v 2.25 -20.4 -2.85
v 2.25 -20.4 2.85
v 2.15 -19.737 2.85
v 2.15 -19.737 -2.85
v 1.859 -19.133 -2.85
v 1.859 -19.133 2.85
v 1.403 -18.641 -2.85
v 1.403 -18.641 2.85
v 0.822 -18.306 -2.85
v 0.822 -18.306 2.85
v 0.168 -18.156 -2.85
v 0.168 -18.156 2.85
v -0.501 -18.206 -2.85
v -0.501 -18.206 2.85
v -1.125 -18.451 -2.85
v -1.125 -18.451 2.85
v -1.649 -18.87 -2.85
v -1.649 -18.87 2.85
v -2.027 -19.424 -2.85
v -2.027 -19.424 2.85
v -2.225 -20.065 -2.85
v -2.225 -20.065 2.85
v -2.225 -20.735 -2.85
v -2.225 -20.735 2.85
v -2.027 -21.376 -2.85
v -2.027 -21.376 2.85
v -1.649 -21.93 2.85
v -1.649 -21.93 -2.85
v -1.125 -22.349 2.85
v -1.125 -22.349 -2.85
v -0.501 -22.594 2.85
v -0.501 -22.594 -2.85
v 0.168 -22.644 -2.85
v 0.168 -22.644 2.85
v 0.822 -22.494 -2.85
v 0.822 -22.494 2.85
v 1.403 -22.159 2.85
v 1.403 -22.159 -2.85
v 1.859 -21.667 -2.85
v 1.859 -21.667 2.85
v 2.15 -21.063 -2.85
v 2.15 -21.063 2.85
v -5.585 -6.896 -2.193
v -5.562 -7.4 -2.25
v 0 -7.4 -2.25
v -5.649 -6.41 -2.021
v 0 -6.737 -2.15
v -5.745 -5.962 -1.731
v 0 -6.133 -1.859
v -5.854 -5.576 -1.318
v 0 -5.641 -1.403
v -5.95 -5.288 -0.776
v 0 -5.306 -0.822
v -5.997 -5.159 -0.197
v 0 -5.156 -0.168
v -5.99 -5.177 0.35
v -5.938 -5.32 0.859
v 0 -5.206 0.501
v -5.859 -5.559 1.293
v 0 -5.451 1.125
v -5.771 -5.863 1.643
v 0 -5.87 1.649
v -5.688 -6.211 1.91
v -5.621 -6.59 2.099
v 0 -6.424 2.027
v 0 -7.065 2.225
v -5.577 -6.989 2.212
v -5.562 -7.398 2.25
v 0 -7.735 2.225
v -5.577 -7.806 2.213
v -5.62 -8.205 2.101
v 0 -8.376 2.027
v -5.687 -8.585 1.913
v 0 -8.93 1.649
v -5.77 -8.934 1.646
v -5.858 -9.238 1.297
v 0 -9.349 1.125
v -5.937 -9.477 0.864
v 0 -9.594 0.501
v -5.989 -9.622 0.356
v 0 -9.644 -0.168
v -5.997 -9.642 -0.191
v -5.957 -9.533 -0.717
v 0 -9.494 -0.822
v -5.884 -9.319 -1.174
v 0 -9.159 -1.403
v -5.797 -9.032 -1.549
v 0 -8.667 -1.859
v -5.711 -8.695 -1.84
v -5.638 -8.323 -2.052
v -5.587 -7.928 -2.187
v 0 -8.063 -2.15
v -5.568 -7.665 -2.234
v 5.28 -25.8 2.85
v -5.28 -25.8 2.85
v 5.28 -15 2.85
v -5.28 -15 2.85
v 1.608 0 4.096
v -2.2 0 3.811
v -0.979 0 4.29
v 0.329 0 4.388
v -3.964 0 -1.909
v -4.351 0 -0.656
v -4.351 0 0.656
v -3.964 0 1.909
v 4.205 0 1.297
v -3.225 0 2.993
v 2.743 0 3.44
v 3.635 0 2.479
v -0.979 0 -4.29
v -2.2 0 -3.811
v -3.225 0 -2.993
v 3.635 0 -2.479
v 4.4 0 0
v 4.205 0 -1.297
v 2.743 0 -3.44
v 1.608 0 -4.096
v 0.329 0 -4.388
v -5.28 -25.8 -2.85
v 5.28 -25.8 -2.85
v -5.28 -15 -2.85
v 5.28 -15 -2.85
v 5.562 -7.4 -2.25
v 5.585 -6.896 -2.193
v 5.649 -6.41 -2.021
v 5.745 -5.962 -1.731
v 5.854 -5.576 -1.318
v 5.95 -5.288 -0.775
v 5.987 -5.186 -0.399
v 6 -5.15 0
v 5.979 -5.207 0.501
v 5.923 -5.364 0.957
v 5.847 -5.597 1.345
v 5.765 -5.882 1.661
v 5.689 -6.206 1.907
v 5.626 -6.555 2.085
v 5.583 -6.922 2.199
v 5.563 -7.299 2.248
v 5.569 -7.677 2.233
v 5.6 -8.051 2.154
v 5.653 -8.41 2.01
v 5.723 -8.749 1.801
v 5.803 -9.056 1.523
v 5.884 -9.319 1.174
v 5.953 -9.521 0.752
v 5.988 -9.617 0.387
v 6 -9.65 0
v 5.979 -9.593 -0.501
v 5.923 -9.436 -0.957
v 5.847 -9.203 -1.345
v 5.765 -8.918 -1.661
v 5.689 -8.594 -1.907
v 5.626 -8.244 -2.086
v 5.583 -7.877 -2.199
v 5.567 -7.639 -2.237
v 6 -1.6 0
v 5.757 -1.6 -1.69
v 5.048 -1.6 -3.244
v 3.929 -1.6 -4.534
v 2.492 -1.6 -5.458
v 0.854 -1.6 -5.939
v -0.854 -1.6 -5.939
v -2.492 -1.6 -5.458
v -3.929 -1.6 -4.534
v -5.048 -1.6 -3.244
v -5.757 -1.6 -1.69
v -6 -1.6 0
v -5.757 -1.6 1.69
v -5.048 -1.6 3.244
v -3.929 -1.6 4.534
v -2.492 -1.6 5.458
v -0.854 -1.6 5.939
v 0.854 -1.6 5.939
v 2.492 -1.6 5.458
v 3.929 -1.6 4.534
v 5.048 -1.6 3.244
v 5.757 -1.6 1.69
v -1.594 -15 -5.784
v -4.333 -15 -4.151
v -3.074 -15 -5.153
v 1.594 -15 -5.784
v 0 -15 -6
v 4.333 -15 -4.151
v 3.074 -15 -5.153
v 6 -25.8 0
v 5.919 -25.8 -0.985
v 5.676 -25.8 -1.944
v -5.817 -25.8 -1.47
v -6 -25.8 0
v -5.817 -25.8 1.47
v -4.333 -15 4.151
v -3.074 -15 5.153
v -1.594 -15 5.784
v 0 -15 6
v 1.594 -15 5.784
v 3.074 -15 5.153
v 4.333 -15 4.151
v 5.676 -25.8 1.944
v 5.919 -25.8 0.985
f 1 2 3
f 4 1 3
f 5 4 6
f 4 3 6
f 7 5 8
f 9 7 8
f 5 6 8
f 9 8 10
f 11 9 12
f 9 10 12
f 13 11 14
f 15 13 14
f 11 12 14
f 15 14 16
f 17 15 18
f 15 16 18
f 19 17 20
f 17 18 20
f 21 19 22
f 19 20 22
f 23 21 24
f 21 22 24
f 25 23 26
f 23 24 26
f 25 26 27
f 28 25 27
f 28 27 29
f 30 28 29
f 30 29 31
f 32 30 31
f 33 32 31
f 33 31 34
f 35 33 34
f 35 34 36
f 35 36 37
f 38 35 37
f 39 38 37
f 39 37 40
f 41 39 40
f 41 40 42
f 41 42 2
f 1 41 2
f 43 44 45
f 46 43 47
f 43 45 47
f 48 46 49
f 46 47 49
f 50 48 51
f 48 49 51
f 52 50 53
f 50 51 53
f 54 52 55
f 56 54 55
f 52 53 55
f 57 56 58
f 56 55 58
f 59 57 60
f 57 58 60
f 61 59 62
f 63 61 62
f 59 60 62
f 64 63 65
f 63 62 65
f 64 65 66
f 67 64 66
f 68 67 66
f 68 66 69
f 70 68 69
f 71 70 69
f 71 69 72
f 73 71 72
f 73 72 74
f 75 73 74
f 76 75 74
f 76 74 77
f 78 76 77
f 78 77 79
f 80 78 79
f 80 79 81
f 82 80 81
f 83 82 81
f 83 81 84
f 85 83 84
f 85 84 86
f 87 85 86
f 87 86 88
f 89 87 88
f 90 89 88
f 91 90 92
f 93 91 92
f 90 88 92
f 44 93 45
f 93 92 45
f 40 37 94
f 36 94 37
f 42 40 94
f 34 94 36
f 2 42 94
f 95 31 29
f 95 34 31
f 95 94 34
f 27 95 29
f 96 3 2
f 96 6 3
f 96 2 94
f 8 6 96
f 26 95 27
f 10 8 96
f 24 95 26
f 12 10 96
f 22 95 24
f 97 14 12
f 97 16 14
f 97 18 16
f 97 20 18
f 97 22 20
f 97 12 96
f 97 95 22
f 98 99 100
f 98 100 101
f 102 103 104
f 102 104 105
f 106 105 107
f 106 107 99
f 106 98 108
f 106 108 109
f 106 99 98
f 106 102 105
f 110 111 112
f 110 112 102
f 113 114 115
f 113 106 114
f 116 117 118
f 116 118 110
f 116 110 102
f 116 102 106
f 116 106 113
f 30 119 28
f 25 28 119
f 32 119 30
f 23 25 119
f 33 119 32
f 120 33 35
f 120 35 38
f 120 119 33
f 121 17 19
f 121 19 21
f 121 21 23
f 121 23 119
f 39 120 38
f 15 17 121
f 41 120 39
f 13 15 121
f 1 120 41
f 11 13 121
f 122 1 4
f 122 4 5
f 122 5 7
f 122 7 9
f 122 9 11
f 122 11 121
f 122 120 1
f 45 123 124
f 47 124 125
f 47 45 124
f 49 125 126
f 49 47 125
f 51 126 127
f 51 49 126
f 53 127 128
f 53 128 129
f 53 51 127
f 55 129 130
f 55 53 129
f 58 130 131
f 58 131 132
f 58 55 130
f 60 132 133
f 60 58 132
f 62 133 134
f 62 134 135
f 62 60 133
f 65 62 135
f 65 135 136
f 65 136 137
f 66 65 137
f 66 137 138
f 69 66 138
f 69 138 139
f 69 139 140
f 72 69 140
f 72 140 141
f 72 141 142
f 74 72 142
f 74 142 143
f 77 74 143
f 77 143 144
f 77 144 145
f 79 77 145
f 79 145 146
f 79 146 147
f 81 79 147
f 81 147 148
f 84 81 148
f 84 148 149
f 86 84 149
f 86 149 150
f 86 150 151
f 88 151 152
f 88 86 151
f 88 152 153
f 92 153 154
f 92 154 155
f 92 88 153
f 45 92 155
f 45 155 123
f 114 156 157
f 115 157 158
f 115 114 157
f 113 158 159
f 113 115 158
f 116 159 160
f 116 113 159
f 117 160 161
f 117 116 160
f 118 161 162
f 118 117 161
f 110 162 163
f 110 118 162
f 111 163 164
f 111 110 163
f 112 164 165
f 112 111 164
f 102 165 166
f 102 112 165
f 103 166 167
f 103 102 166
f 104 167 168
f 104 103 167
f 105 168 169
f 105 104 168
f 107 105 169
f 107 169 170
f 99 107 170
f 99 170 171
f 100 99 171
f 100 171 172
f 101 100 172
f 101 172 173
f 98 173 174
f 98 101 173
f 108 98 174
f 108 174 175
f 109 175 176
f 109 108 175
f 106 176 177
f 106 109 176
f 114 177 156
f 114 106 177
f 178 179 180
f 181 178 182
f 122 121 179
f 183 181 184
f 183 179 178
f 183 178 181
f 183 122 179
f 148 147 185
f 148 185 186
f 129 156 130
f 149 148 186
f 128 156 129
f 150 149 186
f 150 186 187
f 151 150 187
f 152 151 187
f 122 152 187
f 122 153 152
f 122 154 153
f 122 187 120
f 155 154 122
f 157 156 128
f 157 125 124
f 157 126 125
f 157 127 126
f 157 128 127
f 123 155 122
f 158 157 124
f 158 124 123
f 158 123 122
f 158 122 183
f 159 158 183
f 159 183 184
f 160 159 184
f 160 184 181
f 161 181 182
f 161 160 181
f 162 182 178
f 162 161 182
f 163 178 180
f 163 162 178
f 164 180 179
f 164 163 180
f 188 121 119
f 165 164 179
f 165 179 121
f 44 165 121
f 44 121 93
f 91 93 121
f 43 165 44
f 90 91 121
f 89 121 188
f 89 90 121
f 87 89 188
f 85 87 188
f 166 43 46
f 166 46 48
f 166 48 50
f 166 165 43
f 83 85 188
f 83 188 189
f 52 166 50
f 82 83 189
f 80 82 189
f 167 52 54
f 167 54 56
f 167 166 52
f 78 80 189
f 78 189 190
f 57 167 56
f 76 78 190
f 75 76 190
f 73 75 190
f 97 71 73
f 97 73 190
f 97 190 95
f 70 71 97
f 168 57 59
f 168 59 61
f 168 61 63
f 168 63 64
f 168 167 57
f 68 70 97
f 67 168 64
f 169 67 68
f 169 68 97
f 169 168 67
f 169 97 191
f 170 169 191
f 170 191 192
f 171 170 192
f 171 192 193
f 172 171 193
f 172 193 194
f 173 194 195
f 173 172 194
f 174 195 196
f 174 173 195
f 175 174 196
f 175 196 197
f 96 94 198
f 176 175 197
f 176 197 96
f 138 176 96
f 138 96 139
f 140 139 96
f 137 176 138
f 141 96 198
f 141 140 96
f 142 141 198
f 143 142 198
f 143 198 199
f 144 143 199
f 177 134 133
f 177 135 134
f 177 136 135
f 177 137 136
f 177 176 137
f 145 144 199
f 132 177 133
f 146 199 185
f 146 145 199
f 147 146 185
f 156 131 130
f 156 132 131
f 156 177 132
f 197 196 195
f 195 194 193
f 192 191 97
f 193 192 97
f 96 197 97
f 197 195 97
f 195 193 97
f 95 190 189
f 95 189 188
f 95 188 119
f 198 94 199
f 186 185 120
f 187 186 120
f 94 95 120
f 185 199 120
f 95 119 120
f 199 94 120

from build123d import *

# Parameters (mm, degrees)
SKETCH1_R               = 6
BOSS_EXTRUDE1_DEPTH     = 25.8
CHAMFER1_SIZE           = 1.6
SKETCH2_W               = 3.15
SKETCH2_H               = 10.8
CUT_EXTRUDE1_DEPTH      = 7
CUT_EXTRUDE1_DEPTH_BACK = 7
SKETCH3_R               = 2.25
CUT_EXTRUDE2_DEPTH      = 4.15
CUT_EXTRUDE2_DEPTH_BACK = 9.85
SKETCH4_R               = 2.25
CUT_EXTRUDE3_DEPTH      = 7
CUT_EXTRUDE3_DEPTH_BACK = 7


with BuildPart() as part:
    # Sketch1 → Boss-Extrude1 (new body)
    with BuildSketch(Plane(origin=(0, 0, 0), x_dir=(1, 0, 0), z_dir=(0, 1, 0))):
        Circle(SKETCH1_R)
    extrude(amount=-BOSS_EXTRUDE1_DEPTH)

    # Chamfer1
    chamfer1_edges = [part.edges().sort_by_distance(p)[0] for p in [
        (-6, 0, 0),
    ]]
    chamfer(chamfer1_edges, length=CHAMFER1_SIZE)

    # Sketch2 → Cut-Extrude1 (cut, two sides)
    with BuildSketch(Plane(origin=(0, 0, 0), x_dir=(0, 0, -1), z_dir=(1, 0, 0))) as cut_extrude1_sk:
        with Locations((4.425, -20.4)):
            Rectangle(SKETCH2_W, SKETCH2_H)
        with Locations((-4.425, -20.4)):
            Rectangle(SKETCH2_W, SKETCH2_H)
    extrude(amount=CUT_EXTRUDE1_DEPTH, mode=Mode.SUBTRACT)
    extrude(cut_extrude1_sk.sketch, amount=-CUT_EXTRUDE1_DEPTH_BACK, mode=Mode.SUBTRACT)

    # Sketch3 → Cut-Extrude2 (cut, two sides)
    with BuildSketch(Plane.XY.offset(2.85)) as cut_extrude2_sk:
        with Locations((0, -20.4)):
            Circle(SKETCH3_R)
    extrude(amount=CUT_EXTRUDE2_DEPTH, mode=Mode.SUBTRACT)
    extrude(cut_extrude2_sk.sketch, amount=-CUT_EXTRUDE2_DEPTH_BACK, mode=Mode.SUBTRACT)

    # Sketch4 → Cut-Extrude3 (cut, two sides)
    with BuildSketch(Plane(origin=(0, 0, 0), x_dir=(0, 0, -1), z_dir=(1, 0, 0))) as cut_extrude3_sk:
        with Locations((0, -7.4)):
            Circle(SKETCH4_R)
    extrude(amount=CUT_EXTRUDE3_DEPTH, mode=Mode.SUBTRACT)
    extrude(cut_extrude3_sk.sketch, amount=-CUT_EXTRUDE3_DEPTH_BACK, mode=Mode.SUBTRACT)


solid = part.part
